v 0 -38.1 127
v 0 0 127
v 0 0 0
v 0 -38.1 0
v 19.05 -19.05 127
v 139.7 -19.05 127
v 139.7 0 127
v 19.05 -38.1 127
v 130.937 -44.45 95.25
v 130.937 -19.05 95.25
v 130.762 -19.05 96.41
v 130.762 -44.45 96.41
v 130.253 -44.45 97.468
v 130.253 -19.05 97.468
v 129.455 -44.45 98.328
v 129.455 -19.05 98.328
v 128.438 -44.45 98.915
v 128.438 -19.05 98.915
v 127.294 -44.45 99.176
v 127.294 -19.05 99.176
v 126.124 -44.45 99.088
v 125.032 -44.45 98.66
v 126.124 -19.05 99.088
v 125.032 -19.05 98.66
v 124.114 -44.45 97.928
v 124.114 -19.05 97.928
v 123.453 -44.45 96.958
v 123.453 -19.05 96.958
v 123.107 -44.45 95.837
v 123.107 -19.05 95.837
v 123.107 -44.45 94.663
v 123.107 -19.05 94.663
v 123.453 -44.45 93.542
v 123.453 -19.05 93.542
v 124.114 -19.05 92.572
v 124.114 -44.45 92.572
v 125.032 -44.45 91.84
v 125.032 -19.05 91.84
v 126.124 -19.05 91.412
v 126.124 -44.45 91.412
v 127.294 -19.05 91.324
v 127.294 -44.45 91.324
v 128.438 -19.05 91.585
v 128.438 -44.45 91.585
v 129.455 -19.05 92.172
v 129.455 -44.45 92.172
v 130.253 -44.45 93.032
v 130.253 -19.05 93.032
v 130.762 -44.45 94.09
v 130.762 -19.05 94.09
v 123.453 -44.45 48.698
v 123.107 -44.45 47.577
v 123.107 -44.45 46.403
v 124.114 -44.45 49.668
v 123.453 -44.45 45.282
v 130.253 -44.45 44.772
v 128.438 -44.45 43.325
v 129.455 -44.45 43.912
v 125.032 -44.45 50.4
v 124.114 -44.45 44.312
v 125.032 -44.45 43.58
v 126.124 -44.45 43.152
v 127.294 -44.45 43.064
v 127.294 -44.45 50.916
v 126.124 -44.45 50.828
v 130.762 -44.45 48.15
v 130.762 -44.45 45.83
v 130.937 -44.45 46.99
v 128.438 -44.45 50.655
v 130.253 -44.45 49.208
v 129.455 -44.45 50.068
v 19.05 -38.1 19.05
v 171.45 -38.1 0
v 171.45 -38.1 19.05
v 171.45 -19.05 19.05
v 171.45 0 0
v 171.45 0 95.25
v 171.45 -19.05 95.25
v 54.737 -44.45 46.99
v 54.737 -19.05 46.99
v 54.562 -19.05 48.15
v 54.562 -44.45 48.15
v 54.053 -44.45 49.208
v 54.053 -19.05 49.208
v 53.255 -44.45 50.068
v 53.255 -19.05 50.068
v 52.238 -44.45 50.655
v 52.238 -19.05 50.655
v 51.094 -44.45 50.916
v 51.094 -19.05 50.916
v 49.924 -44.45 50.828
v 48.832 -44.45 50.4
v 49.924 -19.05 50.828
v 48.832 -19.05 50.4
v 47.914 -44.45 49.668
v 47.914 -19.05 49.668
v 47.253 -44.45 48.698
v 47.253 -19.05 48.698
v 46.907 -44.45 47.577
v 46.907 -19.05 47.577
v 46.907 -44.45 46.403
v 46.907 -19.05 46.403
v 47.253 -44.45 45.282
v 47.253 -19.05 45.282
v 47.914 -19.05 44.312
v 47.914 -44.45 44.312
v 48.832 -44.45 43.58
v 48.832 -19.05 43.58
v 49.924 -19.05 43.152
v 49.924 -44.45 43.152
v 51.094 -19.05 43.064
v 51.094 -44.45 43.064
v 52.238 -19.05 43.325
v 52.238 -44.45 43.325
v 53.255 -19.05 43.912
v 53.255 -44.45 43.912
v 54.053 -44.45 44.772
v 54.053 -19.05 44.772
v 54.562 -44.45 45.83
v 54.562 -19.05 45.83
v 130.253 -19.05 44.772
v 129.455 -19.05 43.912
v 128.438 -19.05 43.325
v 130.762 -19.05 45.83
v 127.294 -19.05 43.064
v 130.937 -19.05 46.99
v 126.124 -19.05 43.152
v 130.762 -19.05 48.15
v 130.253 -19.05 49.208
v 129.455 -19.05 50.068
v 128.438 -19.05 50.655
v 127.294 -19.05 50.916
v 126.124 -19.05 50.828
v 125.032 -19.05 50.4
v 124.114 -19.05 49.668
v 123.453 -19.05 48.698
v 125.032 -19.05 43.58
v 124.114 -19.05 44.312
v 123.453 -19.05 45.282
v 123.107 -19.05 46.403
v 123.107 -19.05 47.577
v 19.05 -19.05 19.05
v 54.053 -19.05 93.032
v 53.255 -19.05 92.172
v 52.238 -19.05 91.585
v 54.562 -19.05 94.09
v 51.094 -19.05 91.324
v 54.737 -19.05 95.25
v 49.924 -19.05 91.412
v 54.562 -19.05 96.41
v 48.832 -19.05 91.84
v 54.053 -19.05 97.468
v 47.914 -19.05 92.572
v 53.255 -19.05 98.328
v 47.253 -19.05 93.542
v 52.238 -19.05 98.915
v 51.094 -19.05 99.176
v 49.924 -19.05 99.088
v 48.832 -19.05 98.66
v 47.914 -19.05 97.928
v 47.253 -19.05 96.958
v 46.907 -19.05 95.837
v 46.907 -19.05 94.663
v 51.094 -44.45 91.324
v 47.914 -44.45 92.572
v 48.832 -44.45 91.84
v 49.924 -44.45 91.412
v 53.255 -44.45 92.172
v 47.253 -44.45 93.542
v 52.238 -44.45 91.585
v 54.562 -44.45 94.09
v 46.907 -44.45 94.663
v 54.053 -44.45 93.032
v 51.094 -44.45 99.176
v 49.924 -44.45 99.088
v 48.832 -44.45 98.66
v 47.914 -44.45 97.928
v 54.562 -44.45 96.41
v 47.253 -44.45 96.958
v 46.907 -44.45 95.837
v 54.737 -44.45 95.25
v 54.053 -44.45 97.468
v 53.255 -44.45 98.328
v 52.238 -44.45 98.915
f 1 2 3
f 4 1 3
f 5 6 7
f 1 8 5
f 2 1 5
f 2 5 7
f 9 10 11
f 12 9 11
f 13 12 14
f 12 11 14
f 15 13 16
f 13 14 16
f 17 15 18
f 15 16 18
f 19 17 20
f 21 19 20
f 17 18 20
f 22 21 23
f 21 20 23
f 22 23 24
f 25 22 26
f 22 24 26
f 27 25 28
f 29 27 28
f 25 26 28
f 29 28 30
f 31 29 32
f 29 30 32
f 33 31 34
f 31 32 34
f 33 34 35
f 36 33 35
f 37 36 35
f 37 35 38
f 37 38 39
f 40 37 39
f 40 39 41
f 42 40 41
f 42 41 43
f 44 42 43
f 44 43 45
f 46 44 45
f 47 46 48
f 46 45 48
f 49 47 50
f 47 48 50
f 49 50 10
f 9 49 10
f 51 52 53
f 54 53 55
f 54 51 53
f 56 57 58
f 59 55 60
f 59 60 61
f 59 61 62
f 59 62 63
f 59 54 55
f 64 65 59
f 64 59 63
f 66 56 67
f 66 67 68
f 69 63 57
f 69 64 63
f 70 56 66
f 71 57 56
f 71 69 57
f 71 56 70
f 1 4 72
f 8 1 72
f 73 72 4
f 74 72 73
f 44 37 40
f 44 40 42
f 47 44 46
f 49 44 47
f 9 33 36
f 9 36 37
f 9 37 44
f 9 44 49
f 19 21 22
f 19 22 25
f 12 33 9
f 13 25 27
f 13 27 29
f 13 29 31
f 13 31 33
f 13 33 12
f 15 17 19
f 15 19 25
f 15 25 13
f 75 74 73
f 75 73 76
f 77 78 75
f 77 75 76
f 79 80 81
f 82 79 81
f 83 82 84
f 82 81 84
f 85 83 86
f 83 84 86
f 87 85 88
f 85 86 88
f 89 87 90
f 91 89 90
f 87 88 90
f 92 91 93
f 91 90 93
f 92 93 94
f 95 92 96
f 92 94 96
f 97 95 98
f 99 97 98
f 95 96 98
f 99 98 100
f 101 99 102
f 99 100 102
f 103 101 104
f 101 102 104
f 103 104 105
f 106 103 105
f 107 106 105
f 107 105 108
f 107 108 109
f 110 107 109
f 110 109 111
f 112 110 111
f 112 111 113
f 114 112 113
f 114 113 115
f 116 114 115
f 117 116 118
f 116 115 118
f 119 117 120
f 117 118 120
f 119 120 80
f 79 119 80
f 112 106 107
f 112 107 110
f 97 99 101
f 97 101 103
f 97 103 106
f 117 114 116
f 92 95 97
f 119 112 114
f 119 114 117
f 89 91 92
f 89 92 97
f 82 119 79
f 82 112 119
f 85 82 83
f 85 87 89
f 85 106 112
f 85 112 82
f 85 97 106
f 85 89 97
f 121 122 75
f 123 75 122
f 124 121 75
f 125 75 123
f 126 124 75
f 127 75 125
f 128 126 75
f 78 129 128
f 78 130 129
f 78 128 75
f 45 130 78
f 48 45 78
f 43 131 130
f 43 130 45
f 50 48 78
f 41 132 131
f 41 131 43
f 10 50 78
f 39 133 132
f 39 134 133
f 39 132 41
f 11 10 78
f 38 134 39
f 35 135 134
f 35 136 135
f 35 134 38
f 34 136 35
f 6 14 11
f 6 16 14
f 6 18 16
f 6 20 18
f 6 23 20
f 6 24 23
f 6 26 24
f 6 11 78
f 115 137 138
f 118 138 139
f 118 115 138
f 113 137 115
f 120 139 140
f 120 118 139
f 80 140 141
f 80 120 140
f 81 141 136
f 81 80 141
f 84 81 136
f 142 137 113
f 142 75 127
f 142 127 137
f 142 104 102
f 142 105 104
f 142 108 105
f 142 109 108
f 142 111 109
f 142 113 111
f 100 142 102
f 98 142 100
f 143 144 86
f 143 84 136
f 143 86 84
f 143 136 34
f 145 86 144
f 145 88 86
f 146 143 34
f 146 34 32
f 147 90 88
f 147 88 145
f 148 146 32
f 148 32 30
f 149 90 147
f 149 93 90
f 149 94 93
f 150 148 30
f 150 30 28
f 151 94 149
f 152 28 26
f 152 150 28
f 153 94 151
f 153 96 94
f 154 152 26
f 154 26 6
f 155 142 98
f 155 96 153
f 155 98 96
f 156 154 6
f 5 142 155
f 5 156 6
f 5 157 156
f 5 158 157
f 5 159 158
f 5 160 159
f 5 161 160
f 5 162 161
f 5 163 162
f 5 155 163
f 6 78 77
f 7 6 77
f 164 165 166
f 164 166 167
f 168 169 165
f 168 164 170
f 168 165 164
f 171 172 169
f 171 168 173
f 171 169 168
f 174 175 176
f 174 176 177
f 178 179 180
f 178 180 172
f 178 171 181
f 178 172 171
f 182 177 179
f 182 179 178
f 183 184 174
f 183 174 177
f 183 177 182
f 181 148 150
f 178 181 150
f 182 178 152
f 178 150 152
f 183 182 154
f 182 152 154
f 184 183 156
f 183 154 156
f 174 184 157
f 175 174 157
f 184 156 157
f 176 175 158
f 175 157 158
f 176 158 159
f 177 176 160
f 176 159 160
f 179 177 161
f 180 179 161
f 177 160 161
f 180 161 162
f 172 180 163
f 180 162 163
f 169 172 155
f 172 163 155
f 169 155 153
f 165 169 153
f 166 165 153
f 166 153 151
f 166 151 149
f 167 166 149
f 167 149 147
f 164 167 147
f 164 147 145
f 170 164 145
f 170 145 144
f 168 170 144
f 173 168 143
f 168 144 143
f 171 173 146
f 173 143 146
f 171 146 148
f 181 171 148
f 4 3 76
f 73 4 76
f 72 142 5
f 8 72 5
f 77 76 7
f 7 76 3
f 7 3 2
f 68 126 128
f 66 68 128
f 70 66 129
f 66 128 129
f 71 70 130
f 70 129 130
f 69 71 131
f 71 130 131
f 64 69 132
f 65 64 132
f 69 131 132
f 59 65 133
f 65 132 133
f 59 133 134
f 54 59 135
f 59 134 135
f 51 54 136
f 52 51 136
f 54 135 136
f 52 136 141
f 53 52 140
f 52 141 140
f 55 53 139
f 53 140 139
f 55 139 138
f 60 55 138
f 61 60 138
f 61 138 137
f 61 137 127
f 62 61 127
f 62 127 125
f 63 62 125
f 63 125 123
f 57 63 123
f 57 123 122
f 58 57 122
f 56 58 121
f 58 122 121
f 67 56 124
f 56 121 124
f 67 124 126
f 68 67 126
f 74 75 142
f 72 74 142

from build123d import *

# Parameters (mm, degrees)
F1_DEPTH = 38.1
F2_W     = 19.05
F2_H     = 107.95
F3_DEPTH = 152.4
F4_SIZE  = 31.75
F5_R     = 3.937
F6_DEPTH = 25.4


with BuildPart() as f1:
    # F0 (on Front) → F1 (new body)
    with BuildSketch(Plane.XZ):
        Polygon((0, 0), (9.30349, 0), (171.45, 0), (171.45, 19.05), (19.05, 19.05), (19.05, 127), (0, 127), align=None)
    extrude(amount=F1_DEPTH)

    # F2 (on face) → F3 (join, through all)
    with BuildSketch(Plane.YZ.offset(19.05)):
        with Locations((-9.525, 73.025)):
            Rectangle(F2_W, F2_H)
    extrude(amount=F3_DEPTH)

    # F4
    f4_edges = [f1.edges().sort_by_distance(p)[0] for p in [
        (171.45, -9.525, 127),
    ]]
    chamfer(f4_edges, length=F4_SIZE)

    # F5 (on face) → F6 (join)
    with BuildSketch(Plane.XZ.offset(19.05)):
        with Locations((50.8, 95.25)):
            Circle(F5_R)
        with Locations((127, 95.25)):
            Circle(F5_R)
        with Locations((127, 46.99)):
            Circle(F5_R)
        with Locations((50.8, 46.99)):
            Circle(F5_R)
    extrude(amount=F6_DEPTH)


solid = f1.part
